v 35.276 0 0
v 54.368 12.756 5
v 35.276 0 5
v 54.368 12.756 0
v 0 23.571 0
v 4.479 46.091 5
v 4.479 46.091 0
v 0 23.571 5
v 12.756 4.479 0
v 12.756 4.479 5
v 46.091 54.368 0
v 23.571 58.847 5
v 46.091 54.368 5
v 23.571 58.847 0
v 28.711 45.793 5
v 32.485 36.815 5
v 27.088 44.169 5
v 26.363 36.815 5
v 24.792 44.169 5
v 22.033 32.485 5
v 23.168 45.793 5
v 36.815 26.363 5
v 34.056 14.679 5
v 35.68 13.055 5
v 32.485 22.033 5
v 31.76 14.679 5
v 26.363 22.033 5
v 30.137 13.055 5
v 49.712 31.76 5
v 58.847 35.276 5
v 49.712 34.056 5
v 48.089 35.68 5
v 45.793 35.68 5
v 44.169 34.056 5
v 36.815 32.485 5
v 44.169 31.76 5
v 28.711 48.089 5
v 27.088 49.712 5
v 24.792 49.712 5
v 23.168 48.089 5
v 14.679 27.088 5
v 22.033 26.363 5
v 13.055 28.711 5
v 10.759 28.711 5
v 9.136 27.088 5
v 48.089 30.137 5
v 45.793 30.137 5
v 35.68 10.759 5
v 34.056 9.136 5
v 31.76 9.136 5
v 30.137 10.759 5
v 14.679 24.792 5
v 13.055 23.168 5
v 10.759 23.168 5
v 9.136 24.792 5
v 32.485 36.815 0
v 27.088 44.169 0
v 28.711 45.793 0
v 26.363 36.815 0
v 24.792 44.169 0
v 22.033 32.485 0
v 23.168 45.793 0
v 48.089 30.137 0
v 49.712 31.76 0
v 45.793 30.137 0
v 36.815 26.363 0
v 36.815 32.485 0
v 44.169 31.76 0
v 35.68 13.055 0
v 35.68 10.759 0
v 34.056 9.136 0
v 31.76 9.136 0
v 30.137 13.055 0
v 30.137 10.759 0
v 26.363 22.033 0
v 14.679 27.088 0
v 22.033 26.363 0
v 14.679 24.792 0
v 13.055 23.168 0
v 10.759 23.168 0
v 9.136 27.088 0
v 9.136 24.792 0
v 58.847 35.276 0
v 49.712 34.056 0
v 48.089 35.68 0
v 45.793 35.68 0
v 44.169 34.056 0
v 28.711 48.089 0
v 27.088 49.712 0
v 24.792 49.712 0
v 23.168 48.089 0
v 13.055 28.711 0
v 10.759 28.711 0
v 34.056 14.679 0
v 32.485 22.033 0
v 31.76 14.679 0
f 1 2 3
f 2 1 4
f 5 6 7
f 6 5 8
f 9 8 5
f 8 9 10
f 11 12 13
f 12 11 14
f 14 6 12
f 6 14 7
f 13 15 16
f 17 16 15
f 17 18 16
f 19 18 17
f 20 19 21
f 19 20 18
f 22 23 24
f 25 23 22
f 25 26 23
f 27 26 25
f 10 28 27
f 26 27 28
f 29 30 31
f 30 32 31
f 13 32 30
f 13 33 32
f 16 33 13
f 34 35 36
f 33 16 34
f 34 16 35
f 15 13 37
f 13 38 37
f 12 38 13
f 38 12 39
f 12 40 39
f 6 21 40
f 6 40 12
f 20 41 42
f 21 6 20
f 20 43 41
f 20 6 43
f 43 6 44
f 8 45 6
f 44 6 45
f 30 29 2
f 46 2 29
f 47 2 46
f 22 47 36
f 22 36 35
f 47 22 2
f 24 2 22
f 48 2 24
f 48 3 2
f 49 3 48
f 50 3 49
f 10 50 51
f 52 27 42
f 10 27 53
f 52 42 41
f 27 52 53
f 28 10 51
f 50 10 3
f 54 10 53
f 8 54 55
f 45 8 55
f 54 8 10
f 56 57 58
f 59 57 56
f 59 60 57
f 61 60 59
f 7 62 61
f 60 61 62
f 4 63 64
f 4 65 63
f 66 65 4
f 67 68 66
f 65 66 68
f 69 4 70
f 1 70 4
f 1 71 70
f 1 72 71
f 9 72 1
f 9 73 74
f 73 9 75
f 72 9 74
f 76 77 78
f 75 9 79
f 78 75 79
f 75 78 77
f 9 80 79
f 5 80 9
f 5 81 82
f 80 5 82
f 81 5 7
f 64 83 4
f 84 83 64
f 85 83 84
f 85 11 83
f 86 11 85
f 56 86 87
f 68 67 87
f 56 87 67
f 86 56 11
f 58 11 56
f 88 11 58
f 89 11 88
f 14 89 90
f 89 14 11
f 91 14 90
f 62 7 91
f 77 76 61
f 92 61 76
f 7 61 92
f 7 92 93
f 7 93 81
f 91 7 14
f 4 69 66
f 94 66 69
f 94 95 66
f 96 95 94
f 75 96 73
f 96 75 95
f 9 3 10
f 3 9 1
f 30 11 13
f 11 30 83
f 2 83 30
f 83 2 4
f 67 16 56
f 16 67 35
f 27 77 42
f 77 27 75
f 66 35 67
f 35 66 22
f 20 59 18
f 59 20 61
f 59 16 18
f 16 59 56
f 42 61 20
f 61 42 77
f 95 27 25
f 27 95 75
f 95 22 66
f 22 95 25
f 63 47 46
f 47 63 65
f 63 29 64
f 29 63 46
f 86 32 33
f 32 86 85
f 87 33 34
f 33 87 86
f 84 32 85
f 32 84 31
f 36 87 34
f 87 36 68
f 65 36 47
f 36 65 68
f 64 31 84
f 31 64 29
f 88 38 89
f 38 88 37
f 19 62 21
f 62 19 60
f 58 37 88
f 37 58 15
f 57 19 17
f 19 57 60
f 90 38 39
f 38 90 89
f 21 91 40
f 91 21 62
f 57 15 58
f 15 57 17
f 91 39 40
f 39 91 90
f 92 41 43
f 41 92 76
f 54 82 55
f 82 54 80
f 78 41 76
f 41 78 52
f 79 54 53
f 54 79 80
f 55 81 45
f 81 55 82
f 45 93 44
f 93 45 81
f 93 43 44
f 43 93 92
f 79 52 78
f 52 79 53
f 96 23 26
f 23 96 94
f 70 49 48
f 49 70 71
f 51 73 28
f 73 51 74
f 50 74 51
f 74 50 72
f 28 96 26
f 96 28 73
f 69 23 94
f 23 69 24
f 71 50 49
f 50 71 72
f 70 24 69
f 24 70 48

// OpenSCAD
$fn = 32;

// ----------------------------------------------------------------------
// Polygon plate: 8-gon R30, 4 bolt windows
// ----------------------------------------------------------------------

// --- parameters (mm) ---
sides = 8;                // number of polygon sides
plate_r = 30;             // circumscribed radius of the polygon
bore_r = 8;               // centre bore radius
bolts = 4;                // number of bolt windows
ring_r = 17.86;           // bolt-circle radius
bolt_r = 3;               // bolt window radius
plate_t = 5;              // plate thickness, Z (extrusion height)

plate_d = 2 * plate_r;  // circumscribed diameter
bore_d = 2 * bore_r;  // centre bore diameter
bolt_d = 2 * bolt_r;  // bolt window diameter
ring_d = 2 * ring_r;  // bolt-circle diameter

profile = [[58.847, 35.276], [46.091, 54.368], [23.571, 58.847], [4.479, 46.091], [0, 23.571], [12.756, 4.479], [35.276, 0], [54.368, 12.756]];  // primary outline, 8 points, counter clockwise
void_1 = [[36.815, 32.485], [32.485, 36.815], [26.363, 36.815], [22.033, 32.485], [22.033, 26.363], [26.363, 22.033], [32.485, 22.033], [36.815, 26.363]];  // centre bore, 8 points
void_2 = [[49.712, 34.056], [48.089, 35.68], [45.793, 35.68], [44.169, 34.056], [44.169, 31.76], [45.793, 30.137], [48.089, 30.137], [49.712, 31.76]];  // bolt window 1, 8 points
void_3 = [[28.711, 48.089], [27.088, 49.712], [24.792, 49.712], [23.168, 48.089], [23.168, 45.793], [24.792, 44.169], [27.088, 44.169], [28.711, 45.793]];  // bolt window 2, 8 points
void_4 = [[14.679, 27.088], [13.055, 28.711], [10.759, 28.711], [9.136, 27.088], [9.136, 24.792], [10.759, 23.168], [13.055, 23.168], [14.679, 24.792]];  // bolt window 3, 8 points
void_5 = [[35.68, 13.055], [34.056, 14.679], [31.76, 14.679], [30.137, 13.055], [30.137, 10.759], [31.76, 9.136], [34.056, 9.136], [35.68, 10.759]];  // bolt window 4, 8 points

// --- the one profile operation ---
difference() {
  linear_extrude(height = plate_t) polygon(points = profile);
  translate([0, 0, -1])
    linear_extrude(height = plate_t + 2) polygon(points = void_1);
  translate([0, 0, -1])
    linear_extrude(height = plate_t + 2) polygon(points = void_2);
  translate([0, 0, -1])
    linear_extrude(height = plate_t + 2) polygon(points = void_3);
  translate([0, 0, -1])
    linear_extrude(height = plate_t + 2) polygon(points = void_4);
  translate([0, 0, -1])
    linear_extrude(height = plate_t + 2) polygon(points = void_5);
}
